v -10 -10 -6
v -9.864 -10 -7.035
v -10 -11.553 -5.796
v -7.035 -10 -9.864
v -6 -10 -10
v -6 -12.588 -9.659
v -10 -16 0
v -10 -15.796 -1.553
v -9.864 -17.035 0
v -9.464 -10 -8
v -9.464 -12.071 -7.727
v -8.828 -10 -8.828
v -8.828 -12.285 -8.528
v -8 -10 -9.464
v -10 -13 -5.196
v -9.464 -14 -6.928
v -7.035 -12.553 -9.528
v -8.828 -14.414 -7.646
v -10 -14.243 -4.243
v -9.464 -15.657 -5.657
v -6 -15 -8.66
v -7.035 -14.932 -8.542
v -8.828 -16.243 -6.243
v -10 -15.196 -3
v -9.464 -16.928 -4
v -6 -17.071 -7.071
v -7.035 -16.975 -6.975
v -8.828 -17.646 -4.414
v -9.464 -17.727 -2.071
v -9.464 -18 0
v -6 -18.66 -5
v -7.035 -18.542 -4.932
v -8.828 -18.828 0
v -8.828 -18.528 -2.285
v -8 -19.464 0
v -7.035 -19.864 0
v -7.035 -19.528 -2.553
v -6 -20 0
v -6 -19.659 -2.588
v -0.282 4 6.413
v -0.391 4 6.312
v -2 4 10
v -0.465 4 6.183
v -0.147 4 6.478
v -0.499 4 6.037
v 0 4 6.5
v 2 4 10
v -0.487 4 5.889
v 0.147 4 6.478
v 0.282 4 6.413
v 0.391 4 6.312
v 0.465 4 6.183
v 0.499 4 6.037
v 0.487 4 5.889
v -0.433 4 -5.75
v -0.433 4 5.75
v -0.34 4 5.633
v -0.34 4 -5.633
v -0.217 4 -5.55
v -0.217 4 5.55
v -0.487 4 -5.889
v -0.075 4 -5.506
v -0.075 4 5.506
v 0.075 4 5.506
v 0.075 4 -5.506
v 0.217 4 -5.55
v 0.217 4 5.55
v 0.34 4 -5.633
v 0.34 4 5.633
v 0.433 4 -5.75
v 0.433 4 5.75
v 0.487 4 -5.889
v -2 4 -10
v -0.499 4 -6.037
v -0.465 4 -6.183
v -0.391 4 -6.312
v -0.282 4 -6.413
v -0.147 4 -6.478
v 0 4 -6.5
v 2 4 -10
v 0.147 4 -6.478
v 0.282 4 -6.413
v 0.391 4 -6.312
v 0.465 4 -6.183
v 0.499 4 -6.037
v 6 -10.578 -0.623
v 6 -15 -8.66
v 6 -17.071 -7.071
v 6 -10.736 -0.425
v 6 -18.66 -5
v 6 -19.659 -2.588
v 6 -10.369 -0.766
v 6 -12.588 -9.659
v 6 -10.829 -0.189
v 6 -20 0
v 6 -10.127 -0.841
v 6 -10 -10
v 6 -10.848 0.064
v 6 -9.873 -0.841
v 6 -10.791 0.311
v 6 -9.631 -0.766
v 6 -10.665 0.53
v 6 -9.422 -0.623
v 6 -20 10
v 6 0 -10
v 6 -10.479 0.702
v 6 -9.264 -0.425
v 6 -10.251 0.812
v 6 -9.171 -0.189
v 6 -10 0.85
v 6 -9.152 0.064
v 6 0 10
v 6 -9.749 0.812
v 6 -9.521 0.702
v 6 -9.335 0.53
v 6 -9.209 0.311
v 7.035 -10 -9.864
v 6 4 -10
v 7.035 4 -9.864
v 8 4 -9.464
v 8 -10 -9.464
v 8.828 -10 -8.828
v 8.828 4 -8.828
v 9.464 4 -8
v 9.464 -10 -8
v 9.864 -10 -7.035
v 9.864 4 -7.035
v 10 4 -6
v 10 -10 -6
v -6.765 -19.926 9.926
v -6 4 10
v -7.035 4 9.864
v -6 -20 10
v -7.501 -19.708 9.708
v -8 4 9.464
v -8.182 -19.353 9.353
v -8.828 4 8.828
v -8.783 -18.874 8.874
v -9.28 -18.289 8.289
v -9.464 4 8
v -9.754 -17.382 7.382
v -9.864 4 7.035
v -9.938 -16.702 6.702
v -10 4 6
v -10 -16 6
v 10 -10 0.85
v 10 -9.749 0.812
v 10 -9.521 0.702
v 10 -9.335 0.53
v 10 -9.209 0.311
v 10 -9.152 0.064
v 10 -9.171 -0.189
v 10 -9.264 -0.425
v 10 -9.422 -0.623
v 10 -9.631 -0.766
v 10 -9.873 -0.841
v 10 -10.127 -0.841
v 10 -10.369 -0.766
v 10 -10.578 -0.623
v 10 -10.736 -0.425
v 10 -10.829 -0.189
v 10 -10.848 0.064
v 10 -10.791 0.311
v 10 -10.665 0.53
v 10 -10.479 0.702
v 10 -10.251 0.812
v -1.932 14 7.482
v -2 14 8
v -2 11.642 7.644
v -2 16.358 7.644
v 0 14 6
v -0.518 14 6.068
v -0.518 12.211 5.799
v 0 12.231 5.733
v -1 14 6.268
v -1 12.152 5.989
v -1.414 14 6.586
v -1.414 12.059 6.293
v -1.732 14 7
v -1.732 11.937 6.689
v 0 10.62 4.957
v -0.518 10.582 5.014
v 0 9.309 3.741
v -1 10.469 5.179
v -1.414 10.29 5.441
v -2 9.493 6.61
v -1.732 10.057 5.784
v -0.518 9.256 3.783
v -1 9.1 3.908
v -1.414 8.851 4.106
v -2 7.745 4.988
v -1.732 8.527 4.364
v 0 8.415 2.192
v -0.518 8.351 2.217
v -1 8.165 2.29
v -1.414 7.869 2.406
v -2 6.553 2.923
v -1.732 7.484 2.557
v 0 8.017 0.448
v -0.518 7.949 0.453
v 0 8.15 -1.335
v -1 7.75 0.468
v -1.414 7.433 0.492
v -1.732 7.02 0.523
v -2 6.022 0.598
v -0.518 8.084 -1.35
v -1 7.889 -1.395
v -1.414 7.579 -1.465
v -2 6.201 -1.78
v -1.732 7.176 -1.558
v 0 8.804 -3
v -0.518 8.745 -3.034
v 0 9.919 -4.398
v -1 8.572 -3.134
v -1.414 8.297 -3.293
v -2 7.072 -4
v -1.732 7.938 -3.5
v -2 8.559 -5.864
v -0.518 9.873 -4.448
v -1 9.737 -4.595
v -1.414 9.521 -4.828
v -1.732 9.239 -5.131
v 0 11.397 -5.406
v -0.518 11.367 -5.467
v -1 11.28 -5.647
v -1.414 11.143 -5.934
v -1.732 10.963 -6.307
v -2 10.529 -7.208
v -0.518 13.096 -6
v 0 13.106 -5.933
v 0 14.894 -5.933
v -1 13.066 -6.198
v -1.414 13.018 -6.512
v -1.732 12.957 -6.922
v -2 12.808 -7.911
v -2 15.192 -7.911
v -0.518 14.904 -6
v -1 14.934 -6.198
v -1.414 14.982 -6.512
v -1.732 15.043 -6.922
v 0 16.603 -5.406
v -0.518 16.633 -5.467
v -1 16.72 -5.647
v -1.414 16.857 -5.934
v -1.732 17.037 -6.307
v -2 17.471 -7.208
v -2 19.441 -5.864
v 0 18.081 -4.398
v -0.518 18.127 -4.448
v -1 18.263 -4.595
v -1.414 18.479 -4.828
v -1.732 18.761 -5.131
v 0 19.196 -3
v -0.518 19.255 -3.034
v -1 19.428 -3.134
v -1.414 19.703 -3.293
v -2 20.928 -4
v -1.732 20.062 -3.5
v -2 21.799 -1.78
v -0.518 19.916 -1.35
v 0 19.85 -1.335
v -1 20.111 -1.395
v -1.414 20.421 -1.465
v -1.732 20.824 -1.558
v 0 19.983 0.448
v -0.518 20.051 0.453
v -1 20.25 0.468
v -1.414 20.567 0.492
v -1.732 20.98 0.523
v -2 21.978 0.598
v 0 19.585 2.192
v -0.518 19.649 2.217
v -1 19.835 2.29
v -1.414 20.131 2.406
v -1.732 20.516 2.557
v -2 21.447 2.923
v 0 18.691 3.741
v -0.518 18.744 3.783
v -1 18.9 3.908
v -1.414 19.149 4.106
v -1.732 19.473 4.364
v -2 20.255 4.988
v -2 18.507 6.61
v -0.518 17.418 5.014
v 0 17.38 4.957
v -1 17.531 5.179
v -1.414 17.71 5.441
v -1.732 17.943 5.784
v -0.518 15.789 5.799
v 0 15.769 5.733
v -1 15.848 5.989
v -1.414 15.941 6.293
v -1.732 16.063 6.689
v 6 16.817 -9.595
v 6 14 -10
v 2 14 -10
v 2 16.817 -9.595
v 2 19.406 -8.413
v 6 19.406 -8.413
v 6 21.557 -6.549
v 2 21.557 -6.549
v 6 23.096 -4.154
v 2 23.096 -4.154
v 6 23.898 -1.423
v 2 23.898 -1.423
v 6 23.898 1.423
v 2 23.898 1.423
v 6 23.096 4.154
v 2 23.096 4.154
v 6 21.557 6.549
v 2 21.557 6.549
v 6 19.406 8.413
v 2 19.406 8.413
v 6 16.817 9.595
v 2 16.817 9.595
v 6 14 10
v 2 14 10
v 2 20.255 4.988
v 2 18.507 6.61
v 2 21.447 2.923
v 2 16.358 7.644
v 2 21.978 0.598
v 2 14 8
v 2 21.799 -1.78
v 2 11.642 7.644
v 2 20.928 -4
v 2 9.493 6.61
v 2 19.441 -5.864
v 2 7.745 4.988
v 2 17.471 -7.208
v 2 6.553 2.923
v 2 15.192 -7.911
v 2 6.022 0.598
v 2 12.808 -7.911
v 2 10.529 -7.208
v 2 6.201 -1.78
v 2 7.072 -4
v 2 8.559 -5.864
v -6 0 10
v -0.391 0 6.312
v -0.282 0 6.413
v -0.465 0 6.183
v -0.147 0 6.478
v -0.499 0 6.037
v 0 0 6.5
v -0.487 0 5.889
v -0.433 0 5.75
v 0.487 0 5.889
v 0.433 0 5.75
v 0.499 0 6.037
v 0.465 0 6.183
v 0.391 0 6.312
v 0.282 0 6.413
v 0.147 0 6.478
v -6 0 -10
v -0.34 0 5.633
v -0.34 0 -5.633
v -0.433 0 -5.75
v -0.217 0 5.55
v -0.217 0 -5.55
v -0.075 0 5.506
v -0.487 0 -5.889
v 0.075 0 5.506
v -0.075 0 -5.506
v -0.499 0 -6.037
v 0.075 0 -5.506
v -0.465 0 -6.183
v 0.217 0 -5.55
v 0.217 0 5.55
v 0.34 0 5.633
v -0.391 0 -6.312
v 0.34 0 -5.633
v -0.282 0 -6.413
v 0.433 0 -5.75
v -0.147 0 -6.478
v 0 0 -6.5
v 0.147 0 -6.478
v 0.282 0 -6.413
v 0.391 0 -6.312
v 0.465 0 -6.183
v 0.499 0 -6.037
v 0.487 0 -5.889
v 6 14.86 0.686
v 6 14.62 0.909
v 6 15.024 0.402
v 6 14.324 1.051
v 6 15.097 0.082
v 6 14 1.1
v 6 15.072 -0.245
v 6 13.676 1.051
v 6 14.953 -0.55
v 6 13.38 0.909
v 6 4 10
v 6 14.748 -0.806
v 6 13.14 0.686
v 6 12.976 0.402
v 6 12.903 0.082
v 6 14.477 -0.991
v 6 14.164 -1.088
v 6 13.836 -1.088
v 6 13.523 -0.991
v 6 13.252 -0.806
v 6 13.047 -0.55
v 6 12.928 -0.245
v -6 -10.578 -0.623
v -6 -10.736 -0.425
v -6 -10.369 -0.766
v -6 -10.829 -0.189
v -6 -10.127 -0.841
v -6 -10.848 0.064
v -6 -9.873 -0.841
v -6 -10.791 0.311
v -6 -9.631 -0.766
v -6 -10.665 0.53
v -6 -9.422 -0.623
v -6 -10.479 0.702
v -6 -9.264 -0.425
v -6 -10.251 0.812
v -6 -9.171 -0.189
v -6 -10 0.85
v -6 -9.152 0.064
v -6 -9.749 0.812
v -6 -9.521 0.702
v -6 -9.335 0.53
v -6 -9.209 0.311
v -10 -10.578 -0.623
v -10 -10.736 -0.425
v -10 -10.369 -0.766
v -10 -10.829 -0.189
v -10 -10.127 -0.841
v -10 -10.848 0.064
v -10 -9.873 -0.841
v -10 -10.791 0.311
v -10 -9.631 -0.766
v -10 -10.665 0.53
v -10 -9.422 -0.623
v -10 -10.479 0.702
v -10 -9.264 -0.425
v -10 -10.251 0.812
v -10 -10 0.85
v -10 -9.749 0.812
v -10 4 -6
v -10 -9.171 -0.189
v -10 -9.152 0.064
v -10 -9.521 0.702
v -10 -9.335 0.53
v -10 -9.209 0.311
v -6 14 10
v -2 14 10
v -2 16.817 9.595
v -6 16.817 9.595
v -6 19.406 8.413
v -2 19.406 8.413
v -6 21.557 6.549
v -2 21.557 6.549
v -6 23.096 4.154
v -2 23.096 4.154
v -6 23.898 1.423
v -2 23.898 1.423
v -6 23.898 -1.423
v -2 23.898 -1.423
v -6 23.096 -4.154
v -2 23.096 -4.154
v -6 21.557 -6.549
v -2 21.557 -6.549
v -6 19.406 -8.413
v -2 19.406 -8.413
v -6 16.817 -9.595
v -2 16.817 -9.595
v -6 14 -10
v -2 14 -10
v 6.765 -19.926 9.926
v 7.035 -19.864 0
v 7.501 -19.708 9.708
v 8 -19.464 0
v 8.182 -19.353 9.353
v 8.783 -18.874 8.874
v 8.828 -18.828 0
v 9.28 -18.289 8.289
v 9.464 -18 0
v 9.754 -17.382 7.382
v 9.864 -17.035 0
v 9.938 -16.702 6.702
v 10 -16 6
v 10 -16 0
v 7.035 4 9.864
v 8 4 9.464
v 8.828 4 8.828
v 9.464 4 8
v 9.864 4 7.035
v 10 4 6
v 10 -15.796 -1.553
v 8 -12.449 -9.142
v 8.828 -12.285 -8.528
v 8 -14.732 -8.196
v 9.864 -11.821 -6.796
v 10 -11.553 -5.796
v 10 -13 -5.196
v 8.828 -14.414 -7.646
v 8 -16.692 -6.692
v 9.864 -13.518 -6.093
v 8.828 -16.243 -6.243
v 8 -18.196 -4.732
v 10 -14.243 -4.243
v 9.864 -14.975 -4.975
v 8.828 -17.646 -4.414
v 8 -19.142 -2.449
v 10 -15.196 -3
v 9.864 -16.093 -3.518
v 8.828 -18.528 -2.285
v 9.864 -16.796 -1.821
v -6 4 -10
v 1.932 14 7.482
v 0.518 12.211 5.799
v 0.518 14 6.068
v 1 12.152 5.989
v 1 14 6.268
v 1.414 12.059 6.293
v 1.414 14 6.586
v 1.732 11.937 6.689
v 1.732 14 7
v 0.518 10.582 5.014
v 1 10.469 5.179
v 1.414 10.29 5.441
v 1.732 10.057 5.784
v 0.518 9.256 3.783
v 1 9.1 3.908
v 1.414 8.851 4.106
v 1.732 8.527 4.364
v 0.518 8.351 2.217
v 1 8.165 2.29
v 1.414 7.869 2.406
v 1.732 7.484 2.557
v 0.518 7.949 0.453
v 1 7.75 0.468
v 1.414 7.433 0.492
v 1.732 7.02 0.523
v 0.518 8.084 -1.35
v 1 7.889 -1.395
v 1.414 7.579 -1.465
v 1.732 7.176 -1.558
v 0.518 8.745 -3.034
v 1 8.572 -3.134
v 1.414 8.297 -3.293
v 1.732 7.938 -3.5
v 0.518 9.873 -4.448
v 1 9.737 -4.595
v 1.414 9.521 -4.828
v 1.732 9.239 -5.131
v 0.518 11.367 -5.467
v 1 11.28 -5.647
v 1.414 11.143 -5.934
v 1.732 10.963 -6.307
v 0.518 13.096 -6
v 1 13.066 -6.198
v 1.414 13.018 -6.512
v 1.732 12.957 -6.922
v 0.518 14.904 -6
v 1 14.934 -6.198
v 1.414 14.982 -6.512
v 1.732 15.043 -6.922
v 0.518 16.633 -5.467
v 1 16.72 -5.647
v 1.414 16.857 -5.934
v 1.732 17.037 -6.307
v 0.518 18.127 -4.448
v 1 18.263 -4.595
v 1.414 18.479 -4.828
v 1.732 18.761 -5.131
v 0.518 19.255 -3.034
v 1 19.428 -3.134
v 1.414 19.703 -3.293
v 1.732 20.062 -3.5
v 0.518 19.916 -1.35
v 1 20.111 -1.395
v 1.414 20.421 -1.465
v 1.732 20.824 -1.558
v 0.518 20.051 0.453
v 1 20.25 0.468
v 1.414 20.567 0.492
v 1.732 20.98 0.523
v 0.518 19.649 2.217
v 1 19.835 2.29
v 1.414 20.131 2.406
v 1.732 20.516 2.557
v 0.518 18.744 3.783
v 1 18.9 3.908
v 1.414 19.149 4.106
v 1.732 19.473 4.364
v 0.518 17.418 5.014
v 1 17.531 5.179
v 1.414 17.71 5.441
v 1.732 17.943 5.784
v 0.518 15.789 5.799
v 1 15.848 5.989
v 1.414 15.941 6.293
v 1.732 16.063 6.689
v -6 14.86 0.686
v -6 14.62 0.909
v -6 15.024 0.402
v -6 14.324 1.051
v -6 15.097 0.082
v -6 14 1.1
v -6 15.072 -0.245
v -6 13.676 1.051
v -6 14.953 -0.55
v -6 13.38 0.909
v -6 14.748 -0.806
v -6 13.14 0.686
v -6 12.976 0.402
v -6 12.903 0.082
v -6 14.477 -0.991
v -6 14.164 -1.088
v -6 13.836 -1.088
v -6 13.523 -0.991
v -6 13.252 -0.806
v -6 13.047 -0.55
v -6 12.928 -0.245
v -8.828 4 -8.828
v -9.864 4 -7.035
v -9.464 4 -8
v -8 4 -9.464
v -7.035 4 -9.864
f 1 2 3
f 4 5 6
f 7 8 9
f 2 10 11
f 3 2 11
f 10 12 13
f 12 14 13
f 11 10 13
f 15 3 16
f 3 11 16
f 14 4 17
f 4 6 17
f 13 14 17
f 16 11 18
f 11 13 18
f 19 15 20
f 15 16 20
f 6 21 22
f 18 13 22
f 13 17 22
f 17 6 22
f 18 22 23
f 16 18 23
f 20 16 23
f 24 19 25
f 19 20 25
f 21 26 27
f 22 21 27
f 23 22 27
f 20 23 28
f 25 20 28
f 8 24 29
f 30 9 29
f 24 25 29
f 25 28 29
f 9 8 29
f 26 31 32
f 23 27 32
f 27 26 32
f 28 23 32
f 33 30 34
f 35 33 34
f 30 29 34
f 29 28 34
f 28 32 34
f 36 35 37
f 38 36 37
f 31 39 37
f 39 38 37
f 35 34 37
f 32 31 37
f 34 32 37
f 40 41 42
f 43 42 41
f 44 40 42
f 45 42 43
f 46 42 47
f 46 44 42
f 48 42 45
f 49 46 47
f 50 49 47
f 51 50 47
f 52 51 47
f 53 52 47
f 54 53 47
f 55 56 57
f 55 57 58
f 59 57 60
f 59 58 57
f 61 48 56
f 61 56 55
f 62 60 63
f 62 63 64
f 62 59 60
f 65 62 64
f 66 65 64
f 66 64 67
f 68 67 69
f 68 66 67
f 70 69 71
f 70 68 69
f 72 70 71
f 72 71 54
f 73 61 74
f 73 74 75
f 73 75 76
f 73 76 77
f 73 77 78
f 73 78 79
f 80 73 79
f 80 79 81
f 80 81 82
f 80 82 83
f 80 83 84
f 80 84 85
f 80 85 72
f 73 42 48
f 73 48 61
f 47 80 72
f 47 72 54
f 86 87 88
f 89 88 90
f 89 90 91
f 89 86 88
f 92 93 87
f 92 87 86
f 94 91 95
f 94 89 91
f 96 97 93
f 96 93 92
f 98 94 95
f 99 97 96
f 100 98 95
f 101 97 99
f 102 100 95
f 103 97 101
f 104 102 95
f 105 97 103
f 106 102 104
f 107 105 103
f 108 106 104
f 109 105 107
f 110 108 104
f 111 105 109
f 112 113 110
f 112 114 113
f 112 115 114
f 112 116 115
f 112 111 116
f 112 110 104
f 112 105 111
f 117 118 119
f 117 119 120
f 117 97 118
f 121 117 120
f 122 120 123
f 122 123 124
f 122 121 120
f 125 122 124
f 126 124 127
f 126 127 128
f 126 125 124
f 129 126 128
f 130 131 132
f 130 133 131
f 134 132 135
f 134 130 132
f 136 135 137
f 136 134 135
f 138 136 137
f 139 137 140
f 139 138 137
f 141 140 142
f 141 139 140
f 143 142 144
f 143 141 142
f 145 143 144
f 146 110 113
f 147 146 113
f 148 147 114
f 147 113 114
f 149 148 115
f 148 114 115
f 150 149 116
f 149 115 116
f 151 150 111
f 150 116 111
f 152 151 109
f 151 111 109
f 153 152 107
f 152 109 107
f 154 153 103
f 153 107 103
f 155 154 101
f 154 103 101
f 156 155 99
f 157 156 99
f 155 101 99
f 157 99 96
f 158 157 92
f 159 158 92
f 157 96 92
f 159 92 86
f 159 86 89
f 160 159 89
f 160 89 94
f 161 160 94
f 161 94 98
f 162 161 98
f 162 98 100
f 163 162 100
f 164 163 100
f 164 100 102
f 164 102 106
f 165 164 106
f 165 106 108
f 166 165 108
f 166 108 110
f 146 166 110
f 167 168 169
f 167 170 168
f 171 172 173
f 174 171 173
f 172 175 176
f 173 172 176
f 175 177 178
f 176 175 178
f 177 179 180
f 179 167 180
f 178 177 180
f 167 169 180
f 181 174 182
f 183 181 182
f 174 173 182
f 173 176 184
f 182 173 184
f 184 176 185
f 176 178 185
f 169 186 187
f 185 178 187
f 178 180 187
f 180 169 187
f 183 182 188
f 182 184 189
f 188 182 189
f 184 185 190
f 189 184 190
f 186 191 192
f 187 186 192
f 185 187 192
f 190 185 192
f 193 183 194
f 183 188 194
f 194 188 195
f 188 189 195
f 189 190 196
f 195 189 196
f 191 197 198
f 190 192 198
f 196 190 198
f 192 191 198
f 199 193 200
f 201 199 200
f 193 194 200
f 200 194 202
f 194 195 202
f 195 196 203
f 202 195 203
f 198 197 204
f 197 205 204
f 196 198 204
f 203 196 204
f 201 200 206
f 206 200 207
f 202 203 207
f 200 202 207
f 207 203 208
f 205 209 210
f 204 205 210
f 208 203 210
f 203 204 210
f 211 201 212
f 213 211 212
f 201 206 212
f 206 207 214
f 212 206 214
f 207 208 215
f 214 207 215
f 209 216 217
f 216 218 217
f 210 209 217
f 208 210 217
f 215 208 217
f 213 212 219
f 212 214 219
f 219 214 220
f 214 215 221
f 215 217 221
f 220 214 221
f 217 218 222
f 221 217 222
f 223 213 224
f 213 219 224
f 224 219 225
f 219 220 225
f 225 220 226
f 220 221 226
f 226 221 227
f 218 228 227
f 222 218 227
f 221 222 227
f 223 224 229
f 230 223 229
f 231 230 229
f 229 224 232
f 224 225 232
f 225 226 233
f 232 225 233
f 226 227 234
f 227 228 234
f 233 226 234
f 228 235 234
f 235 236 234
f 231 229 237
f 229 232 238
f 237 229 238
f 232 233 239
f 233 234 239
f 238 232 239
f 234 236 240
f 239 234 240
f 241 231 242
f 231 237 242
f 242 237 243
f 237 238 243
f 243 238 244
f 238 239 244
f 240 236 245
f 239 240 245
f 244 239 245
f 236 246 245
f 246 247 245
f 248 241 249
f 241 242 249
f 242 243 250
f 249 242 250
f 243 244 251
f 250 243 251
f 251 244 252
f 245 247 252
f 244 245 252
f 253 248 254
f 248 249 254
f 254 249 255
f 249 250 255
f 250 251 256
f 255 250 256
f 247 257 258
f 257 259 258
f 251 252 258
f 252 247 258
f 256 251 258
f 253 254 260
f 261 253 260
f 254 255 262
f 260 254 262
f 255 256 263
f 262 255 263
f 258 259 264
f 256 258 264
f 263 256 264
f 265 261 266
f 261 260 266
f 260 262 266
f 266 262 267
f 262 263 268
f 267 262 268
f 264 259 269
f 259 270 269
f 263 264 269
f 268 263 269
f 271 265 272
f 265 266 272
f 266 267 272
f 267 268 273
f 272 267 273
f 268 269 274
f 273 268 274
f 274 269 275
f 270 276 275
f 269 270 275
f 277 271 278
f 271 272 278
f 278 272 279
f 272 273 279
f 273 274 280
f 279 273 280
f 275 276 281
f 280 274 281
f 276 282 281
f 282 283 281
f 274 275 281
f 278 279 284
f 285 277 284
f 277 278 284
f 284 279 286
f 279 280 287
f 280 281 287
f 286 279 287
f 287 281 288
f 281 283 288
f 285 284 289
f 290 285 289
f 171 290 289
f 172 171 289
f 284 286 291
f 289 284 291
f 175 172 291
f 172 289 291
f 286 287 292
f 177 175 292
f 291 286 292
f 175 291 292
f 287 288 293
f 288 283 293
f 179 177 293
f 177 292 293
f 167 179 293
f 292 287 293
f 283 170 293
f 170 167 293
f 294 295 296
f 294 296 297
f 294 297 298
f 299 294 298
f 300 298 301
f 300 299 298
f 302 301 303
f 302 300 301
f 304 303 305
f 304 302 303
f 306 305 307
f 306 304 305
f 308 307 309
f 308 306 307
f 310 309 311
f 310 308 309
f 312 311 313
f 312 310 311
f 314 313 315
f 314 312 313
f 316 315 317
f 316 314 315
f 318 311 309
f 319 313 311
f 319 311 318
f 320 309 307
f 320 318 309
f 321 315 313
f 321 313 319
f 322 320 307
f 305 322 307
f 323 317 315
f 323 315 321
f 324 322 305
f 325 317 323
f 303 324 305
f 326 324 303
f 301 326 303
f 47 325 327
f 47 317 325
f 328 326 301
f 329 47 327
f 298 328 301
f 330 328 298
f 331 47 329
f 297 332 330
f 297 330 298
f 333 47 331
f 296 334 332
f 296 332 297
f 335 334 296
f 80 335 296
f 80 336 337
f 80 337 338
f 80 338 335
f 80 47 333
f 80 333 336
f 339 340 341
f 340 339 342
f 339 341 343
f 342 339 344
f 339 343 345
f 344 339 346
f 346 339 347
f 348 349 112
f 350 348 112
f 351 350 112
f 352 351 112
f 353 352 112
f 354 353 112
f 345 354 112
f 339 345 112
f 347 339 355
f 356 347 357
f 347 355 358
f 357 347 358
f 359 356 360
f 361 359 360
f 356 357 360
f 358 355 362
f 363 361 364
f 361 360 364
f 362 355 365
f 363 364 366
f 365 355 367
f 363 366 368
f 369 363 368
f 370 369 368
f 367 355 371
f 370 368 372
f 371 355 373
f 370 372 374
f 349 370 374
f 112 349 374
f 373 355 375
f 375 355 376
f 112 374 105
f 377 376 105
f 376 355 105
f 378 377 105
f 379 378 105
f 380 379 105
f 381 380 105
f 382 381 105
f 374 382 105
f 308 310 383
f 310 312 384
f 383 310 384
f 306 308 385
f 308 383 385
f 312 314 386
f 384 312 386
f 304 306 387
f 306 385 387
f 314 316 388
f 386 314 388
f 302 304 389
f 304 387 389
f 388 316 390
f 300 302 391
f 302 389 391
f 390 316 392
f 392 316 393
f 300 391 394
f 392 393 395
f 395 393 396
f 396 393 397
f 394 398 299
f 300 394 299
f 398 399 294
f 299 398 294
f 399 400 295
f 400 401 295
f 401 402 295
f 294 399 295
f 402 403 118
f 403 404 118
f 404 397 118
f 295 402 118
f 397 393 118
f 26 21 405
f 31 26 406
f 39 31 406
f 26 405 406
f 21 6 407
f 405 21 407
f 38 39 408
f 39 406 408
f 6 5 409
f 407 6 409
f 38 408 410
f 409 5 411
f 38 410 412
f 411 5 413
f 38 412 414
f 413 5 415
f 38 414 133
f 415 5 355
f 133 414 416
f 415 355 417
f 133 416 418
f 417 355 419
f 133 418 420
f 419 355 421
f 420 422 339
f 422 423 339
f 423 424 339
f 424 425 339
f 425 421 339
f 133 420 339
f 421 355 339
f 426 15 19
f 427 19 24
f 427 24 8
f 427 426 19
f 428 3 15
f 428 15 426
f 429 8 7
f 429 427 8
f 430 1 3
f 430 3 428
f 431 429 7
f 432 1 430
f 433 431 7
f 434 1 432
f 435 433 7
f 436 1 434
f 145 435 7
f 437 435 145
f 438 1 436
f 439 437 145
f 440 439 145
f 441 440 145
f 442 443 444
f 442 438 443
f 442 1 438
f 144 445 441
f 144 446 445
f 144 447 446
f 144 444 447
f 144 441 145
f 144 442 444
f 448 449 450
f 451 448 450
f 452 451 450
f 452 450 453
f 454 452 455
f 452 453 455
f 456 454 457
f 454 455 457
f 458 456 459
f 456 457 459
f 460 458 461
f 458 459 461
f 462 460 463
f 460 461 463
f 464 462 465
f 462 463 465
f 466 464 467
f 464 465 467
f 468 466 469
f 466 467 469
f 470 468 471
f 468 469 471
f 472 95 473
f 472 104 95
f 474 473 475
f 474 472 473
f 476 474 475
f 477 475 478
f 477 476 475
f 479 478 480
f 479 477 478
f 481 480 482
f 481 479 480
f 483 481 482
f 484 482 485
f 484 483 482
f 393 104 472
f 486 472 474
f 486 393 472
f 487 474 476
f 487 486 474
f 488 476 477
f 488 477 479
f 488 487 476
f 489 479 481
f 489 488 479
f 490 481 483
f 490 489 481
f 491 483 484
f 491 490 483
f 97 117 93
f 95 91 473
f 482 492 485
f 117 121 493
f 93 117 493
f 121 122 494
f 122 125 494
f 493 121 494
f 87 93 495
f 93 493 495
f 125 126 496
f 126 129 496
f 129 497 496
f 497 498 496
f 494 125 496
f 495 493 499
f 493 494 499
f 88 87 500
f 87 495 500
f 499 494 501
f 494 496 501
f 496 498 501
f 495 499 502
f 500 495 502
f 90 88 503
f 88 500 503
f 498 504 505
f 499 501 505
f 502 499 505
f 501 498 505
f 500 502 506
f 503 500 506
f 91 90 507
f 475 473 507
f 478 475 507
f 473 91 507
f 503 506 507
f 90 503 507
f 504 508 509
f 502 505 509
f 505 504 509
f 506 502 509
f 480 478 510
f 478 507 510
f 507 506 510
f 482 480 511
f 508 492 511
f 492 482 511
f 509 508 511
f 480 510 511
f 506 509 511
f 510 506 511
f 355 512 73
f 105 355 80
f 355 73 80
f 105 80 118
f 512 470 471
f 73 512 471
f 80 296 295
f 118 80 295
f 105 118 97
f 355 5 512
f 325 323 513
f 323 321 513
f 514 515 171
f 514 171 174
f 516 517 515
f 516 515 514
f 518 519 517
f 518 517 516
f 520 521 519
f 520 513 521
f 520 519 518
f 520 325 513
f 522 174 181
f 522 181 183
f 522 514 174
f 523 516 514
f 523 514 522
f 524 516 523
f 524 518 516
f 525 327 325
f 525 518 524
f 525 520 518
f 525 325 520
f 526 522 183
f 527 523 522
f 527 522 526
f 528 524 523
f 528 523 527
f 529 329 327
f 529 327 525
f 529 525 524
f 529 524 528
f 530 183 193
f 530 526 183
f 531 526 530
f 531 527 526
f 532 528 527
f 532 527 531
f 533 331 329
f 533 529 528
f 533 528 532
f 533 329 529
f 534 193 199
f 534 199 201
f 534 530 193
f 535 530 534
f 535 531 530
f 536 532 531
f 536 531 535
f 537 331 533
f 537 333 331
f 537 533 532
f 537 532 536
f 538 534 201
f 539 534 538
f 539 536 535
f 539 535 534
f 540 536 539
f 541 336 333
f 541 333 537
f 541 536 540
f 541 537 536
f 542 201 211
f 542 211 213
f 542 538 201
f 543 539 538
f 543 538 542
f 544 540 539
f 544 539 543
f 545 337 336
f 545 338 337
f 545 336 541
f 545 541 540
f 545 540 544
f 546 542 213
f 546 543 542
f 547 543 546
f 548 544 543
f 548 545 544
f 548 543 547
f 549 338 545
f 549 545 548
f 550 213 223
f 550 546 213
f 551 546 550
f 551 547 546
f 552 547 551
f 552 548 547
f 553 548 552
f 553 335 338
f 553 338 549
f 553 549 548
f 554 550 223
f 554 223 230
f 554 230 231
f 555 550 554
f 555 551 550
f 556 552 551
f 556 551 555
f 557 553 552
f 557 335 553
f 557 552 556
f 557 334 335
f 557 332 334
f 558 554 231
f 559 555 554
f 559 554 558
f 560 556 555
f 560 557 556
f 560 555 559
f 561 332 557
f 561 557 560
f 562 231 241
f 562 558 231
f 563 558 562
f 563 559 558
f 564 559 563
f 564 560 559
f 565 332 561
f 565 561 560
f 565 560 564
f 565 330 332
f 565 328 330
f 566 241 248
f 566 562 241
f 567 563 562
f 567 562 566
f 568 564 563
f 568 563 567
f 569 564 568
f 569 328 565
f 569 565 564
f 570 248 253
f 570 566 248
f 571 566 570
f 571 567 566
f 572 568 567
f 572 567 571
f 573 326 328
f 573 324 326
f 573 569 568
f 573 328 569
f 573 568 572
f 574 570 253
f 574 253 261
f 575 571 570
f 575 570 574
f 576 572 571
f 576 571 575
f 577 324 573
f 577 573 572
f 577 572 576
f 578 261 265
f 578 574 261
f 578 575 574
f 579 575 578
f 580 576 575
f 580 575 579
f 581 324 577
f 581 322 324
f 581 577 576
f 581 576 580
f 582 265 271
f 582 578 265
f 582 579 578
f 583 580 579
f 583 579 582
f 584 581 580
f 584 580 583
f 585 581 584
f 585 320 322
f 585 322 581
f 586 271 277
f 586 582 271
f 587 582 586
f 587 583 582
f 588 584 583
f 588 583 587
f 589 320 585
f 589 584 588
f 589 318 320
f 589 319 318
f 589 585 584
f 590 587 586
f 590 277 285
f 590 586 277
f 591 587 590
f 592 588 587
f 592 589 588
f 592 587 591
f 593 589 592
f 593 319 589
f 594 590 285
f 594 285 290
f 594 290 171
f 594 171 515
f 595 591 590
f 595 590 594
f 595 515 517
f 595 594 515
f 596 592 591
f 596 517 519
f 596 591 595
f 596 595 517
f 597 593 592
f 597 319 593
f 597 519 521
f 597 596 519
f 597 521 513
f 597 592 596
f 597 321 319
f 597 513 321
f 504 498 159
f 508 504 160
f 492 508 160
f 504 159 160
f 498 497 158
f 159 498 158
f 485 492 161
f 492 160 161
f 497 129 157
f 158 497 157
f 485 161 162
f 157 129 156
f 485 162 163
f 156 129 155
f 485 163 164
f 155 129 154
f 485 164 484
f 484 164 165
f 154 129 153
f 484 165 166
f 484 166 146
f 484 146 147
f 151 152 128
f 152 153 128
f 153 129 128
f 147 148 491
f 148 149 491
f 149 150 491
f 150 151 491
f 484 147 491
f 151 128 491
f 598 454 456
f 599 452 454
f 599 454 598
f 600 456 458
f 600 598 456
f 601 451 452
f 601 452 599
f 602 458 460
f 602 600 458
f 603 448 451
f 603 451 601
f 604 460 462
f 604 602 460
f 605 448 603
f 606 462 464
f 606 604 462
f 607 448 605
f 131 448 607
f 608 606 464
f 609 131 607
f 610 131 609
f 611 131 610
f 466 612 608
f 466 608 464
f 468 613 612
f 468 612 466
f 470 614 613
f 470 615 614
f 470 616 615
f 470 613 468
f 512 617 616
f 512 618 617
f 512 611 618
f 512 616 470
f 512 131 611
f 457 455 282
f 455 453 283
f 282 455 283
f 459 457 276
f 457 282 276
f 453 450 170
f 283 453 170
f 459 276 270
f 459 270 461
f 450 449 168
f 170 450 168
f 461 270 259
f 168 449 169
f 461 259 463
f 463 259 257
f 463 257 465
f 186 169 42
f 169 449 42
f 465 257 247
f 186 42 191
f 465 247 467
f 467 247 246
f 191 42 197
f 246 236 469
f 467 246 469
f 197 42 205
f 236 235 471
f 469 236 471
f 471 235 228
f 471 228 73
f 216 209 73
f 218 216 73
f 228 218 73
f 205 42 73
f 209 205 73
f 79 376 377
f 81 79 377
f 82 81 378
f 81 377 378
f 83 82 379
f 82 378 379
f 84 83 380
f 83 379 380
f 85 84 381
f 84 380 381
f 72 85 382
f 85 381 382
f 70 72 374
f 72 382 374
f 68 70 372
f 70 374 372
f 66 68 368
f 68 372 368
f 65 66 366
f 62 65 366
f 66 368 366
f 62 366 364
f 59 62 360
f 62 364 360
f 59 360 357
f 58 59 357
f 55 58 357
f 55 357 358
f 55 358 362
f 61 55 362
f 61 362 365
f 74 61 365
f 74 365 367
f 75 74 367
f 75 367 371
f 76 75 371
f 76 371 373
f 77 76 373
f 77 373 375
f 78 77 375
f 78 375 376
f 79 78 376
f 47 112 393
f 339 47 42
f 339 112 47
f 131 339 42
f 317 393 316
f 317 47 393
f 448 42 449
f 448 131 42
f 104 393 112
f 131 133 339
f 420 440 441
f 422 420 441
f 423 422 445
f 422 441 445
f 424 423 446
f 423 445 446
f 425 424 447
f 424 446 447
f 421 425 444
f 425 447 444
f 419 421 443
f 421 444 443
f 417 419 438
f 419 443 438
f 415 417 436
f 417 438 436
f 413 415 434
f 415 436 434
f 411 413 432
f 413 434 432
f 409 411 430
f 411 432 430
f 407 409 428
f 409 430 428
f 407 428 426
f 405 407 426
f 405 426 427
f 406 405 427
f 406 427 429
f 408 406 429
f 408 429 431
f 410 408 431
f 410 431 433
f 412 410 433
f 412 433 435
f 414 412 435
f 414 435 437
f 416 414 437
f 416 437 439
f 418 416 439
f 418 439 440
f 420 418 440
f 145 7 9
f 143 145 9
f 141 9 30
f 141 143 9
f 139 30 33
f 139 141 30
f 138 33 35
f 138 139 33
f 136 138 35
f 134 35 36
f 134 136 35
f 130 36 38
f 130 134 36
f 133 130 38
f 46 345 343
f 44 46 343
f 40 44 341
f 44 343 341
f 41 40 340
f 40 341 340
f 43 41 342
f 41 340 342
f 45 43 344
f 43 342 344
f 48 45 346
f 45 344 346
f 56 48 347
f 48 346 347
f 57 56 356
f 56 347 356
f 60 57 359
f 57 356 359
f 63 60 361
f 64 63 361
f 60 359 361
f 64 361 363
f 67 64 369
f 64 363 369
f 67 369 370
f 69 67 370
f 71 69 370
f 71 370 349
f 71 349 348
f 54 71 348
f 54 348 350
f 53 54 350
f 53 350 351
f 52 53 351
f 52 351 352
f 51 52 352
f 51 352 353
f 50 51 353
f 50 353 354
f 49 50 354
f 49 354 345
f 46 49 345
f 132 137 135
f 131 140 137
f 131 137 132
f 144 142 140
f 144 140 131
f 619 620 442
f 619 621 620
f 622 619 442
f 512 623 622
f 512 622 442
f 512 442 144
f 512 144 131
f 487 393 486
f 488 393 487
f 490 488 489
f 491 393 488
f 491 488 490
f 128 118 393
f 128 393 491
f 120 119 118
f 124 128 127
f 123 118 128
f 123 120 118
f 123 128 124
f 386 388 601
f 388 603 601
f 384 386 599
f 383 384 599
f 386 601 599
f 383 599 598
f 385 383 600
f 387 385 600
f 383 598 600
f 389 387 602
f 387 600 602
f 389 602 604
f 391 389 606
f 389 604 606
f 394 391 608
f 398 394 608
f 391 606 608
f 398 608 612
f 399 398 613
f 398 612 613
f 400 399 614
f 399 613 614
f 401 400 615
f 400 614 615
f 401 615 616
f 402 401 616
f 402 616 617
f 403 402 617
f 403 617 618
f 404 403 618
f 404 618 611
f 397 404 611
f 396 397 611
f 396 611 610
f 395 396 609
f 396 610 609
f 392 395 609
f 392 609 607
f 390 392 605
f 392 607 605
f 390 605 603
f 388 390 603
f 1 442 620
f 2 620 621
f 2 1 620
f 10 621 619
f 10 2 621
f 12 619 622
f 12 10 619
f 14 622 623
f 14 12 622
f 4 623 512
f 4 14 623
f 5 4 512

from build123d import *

# Parameters (mm, degrees)
SKETCH1_W           = 20
SKETCH1_H           = 20
BOSS_EXTRUDE1_DEPTH = 4
SKETCH4_W           = 4
SKETCH4_H           = 20
BOSS_EXTRUDE2_DEPTH = 10
BOSS_EXTRUDE3_DEPTH = 4
BOSS_EXTRUDE4_START = -4
BOSS_EXTRUDE4_DEPTH = 4
SKETCH7_R           = 0.85
CUT_EXTRUDE1_DEPTH  = 31
FILLET1_R           = 4
SKETCH8_W           = 4
SKETCH8_H           = 20
BOSS_EXTRUDE5_DEPTH = 10
SKETCH9_R           = 10
BOSS_EXTRUDE6_DEPTH = 4
BOSS_EXTRUDE7_START = -4
SKETCH10_R          = 10
BOSS_EXTRUDE7_DEPTH = 4
SKETCH12_R          = 1.1
CUT_EXTRUDE2_DEPTH  = 31.528675045
SKETCH13_R          = 6
BOSS_EXTRUDE8_DEPTH = 4
SKETCH14_R          = 1.1
CUT_EXTRUDE3_DEPTH  = 4
FILLET2_R           = 2
CUT_EXTRUDE4_REACH  = 29.857
SKETCH16_R          = 0.5


with BuildPart() as part:
    # Sketch1 → Boss-Extrude1 (new body)
    with BuildSketch(Plane(origin=(0, 0, 0), x_dir=(1, 0, 0), z_dir=(0, 1, 0))):
        Rectangle(SKETCH1_W, SKETCH1_H)
    extrude(amount=BOSS_EXTRUDE1_DEPTH)

    # Sketch4 → Boss-Extrude2 (add)
    with BuildSketch(Plane.XZ):
        with Locations((-8, 0)):
            Rectangle(SKETCH4_W, SKETCH4_H)
        with Locations((8, 0)):
            Rectangle(SKETCH4_W, SKETCH4_H)
    extrude(amount=BOSS_EXTRUDE2_DEPTH)

    # Sketch5 → Boss-Extrude3 (add)
    with BuildSketch(Plane.ZY.offset(10)):
        with BuildLine():
            Line((0, -20), (10, -20))
            Line((10, -20), (10, -10))
            ThreePointArc((10, -10), (-7.071067812, -2.928932188), (0, -20))
        make_face()
    extrude(amount=-BOSS_EXTRUDE3_DEPTH)

    # Sketch6 → Boss-Extrude4 (add)
    with BuildSketch(Plane(origin=(10, 0, 0), x_dir=(0, 0, -1), z_dir=(1, 0, 0)).offset(BOSS_EXTRUDE4_START)):
        with BuildLine():
            Line((0, -20), (-10, -20))
            Line((-10, -20), (-10, -10))
            ThreePointArc((-10, -10), (7.071067812, -2.928932188), (0, -20))
        make_face()
    extrude(amount=BOSS_EXTRUDE4_DEPTH)

    # Sketch7 → Cut-Extrude1 (cut, through all)
    with BuildSketch(Plane.ZY.offset(10)):
        with Locations((0, -10)):
            Circle(SKETCH7_R)
    extrude(amount=-CUT_EXTRUDE1_DEPTH, mode=Mode.SUBTRACT)

    # Fillet1
    fillet1_edges = [part.edges().sort_by_distance(p)[0] for p in [
        (-10, -8, 10),
        (-10, -17.071067812, -7.071067812),
        (10, -8, 10),
        (10, -17.071067812, -7.071067812),
        (-10, -3, -10),
        (10, -3, -10),
        (10, -20, 5),
        (-10, -20, 5),
    ]]
    fillet(fillet1_edges, radius=FILLET1_R - 0.0001)  # a hair under: the kernel refuses the full size

    # Sketch8 → Boss-Extrude5 (add)
    with BuildSketch(Plane(origin=(0, 4, 0), x_dir=(1, 0, 0), z_dir=(0, 1, 0))):
        with Locations((4, 0)):
            Rectangle(SKETCH8_W, SKETCH8_H)
        with Locations((-4, 0)):
            Rectangle(SKETCH8_W, SKETCH8_H)
    extrude(amount=BOSS_EXTRUDE5_DEPTH)

    # Sketch9 → Boss-Extrude6 (add)
    with BuildSketch(Plane(origin=(6, 0, 0), x_dir=(0, 0, -1), z_dir=(1, 0, 0))):
        with Locations((0, 14)):
            Circle(SKETCH9_R)
    extrude(amount=-BOSS_EXTRUDE6_DEPTH)

    # Sketch10 → Boss-Extrude7 (add)
    with BuildSketch(Plane.ZY.offset(6).offset(BOSS_EXTRUDE7_START)):
        with Locations((0, 14)):
            Circle(SKETCH10_R)
    extrude(amount=BOSS_EXTRUDE7_DEPTH)

    # Sketch12 → Cut-Extrude2 (cut, through all)
    with BuildSketch(Plane.ZY.offset(6)):
        with Locations((0, 14)):
            Circle(SKETCH12_R)
    extrude(amount=-CUT_EXTRUDE2_DEPTH, mode=Mode.SUBTRACT)

    # Sketch13 → Boss-Extrude8 (add)
    with BuildSketch(Plane(origin=(-2, 0, 0), x_dir=(0, 0, -1), z_dir=(1, 0, 0))):
        with Locations(Location((0, 14, 0), (0, 0, 180))):
            Circle(SKETCH13_R)
    extrude(amount=BOSS_EXTRUDE8_DEPTH)

    # Sketch14 → Cut-Extrude3 (cut)
    with BuildSketch(Plane(origin=(-2, 0, 0), x_dir=(0, 0, -1), z_dir=(1, 0, 0))):
        with Locations(Location((0, 14, 0), (0, 0, 180))):
            Circle(SKETCH14_R)
    extrude(amount=CUT_EXTRUDE3_DEPTH, mode=Mode.SUBTRACT)

    # Fillet2
    fillet2_edges = [part.edges().sort_by_distance(p)[0] for p in [
        (-2, 14, -6),
        (2, 14, -6),
    ]]
    fillet(fillet2_edges, radius=FILLET2_R - 0.0001)  # a hair under: the kernel refuses the full size

    # Sketch16 → Cut-Extrude4 (cut, up to next)
    with BuildSketch(Plane.XZ, mode=Mode.PRIVATE) as cut_extrude4_sk1:
        with Locations(Location((0, -6, 0), (0, 0, 270))):
            Circle(SKETCH16_R)
    cut_extrude4_tool1 = extrude(cut_extrude4_sk1.sketch, amount=-CUT_EXTRUDE4_REACH, mode=Mode.PRIVATE) & part.part
    # Sketch16 → Cut-Extrude4 (cut, up to next)
    with BuildSketch(Plane.XZ, mode=Mode.PRIVATE) as cut_extrude4_sk2:
        with Locations(Location((0, 6, 0), (0, 0, 90))):
            Circle(SKETCH16_R)
    cut_extrude4_tool2 = extrude(cut_extrude4_sk2.sketch, amount=-CUT_EXTRUDE4_REACH, mode=Mode.PRIVATE) & part.part
    add(cut_extrude4_tool1.solids().sort_by_distance((0, 0, -6))[0], mode=Mode.SUBTRACT)
    add(cut_extrude4_tool2.solids().sort_by_distance((0, 0, 6))[0], mode=Mode.SUBTRACT)


solid = part.part
